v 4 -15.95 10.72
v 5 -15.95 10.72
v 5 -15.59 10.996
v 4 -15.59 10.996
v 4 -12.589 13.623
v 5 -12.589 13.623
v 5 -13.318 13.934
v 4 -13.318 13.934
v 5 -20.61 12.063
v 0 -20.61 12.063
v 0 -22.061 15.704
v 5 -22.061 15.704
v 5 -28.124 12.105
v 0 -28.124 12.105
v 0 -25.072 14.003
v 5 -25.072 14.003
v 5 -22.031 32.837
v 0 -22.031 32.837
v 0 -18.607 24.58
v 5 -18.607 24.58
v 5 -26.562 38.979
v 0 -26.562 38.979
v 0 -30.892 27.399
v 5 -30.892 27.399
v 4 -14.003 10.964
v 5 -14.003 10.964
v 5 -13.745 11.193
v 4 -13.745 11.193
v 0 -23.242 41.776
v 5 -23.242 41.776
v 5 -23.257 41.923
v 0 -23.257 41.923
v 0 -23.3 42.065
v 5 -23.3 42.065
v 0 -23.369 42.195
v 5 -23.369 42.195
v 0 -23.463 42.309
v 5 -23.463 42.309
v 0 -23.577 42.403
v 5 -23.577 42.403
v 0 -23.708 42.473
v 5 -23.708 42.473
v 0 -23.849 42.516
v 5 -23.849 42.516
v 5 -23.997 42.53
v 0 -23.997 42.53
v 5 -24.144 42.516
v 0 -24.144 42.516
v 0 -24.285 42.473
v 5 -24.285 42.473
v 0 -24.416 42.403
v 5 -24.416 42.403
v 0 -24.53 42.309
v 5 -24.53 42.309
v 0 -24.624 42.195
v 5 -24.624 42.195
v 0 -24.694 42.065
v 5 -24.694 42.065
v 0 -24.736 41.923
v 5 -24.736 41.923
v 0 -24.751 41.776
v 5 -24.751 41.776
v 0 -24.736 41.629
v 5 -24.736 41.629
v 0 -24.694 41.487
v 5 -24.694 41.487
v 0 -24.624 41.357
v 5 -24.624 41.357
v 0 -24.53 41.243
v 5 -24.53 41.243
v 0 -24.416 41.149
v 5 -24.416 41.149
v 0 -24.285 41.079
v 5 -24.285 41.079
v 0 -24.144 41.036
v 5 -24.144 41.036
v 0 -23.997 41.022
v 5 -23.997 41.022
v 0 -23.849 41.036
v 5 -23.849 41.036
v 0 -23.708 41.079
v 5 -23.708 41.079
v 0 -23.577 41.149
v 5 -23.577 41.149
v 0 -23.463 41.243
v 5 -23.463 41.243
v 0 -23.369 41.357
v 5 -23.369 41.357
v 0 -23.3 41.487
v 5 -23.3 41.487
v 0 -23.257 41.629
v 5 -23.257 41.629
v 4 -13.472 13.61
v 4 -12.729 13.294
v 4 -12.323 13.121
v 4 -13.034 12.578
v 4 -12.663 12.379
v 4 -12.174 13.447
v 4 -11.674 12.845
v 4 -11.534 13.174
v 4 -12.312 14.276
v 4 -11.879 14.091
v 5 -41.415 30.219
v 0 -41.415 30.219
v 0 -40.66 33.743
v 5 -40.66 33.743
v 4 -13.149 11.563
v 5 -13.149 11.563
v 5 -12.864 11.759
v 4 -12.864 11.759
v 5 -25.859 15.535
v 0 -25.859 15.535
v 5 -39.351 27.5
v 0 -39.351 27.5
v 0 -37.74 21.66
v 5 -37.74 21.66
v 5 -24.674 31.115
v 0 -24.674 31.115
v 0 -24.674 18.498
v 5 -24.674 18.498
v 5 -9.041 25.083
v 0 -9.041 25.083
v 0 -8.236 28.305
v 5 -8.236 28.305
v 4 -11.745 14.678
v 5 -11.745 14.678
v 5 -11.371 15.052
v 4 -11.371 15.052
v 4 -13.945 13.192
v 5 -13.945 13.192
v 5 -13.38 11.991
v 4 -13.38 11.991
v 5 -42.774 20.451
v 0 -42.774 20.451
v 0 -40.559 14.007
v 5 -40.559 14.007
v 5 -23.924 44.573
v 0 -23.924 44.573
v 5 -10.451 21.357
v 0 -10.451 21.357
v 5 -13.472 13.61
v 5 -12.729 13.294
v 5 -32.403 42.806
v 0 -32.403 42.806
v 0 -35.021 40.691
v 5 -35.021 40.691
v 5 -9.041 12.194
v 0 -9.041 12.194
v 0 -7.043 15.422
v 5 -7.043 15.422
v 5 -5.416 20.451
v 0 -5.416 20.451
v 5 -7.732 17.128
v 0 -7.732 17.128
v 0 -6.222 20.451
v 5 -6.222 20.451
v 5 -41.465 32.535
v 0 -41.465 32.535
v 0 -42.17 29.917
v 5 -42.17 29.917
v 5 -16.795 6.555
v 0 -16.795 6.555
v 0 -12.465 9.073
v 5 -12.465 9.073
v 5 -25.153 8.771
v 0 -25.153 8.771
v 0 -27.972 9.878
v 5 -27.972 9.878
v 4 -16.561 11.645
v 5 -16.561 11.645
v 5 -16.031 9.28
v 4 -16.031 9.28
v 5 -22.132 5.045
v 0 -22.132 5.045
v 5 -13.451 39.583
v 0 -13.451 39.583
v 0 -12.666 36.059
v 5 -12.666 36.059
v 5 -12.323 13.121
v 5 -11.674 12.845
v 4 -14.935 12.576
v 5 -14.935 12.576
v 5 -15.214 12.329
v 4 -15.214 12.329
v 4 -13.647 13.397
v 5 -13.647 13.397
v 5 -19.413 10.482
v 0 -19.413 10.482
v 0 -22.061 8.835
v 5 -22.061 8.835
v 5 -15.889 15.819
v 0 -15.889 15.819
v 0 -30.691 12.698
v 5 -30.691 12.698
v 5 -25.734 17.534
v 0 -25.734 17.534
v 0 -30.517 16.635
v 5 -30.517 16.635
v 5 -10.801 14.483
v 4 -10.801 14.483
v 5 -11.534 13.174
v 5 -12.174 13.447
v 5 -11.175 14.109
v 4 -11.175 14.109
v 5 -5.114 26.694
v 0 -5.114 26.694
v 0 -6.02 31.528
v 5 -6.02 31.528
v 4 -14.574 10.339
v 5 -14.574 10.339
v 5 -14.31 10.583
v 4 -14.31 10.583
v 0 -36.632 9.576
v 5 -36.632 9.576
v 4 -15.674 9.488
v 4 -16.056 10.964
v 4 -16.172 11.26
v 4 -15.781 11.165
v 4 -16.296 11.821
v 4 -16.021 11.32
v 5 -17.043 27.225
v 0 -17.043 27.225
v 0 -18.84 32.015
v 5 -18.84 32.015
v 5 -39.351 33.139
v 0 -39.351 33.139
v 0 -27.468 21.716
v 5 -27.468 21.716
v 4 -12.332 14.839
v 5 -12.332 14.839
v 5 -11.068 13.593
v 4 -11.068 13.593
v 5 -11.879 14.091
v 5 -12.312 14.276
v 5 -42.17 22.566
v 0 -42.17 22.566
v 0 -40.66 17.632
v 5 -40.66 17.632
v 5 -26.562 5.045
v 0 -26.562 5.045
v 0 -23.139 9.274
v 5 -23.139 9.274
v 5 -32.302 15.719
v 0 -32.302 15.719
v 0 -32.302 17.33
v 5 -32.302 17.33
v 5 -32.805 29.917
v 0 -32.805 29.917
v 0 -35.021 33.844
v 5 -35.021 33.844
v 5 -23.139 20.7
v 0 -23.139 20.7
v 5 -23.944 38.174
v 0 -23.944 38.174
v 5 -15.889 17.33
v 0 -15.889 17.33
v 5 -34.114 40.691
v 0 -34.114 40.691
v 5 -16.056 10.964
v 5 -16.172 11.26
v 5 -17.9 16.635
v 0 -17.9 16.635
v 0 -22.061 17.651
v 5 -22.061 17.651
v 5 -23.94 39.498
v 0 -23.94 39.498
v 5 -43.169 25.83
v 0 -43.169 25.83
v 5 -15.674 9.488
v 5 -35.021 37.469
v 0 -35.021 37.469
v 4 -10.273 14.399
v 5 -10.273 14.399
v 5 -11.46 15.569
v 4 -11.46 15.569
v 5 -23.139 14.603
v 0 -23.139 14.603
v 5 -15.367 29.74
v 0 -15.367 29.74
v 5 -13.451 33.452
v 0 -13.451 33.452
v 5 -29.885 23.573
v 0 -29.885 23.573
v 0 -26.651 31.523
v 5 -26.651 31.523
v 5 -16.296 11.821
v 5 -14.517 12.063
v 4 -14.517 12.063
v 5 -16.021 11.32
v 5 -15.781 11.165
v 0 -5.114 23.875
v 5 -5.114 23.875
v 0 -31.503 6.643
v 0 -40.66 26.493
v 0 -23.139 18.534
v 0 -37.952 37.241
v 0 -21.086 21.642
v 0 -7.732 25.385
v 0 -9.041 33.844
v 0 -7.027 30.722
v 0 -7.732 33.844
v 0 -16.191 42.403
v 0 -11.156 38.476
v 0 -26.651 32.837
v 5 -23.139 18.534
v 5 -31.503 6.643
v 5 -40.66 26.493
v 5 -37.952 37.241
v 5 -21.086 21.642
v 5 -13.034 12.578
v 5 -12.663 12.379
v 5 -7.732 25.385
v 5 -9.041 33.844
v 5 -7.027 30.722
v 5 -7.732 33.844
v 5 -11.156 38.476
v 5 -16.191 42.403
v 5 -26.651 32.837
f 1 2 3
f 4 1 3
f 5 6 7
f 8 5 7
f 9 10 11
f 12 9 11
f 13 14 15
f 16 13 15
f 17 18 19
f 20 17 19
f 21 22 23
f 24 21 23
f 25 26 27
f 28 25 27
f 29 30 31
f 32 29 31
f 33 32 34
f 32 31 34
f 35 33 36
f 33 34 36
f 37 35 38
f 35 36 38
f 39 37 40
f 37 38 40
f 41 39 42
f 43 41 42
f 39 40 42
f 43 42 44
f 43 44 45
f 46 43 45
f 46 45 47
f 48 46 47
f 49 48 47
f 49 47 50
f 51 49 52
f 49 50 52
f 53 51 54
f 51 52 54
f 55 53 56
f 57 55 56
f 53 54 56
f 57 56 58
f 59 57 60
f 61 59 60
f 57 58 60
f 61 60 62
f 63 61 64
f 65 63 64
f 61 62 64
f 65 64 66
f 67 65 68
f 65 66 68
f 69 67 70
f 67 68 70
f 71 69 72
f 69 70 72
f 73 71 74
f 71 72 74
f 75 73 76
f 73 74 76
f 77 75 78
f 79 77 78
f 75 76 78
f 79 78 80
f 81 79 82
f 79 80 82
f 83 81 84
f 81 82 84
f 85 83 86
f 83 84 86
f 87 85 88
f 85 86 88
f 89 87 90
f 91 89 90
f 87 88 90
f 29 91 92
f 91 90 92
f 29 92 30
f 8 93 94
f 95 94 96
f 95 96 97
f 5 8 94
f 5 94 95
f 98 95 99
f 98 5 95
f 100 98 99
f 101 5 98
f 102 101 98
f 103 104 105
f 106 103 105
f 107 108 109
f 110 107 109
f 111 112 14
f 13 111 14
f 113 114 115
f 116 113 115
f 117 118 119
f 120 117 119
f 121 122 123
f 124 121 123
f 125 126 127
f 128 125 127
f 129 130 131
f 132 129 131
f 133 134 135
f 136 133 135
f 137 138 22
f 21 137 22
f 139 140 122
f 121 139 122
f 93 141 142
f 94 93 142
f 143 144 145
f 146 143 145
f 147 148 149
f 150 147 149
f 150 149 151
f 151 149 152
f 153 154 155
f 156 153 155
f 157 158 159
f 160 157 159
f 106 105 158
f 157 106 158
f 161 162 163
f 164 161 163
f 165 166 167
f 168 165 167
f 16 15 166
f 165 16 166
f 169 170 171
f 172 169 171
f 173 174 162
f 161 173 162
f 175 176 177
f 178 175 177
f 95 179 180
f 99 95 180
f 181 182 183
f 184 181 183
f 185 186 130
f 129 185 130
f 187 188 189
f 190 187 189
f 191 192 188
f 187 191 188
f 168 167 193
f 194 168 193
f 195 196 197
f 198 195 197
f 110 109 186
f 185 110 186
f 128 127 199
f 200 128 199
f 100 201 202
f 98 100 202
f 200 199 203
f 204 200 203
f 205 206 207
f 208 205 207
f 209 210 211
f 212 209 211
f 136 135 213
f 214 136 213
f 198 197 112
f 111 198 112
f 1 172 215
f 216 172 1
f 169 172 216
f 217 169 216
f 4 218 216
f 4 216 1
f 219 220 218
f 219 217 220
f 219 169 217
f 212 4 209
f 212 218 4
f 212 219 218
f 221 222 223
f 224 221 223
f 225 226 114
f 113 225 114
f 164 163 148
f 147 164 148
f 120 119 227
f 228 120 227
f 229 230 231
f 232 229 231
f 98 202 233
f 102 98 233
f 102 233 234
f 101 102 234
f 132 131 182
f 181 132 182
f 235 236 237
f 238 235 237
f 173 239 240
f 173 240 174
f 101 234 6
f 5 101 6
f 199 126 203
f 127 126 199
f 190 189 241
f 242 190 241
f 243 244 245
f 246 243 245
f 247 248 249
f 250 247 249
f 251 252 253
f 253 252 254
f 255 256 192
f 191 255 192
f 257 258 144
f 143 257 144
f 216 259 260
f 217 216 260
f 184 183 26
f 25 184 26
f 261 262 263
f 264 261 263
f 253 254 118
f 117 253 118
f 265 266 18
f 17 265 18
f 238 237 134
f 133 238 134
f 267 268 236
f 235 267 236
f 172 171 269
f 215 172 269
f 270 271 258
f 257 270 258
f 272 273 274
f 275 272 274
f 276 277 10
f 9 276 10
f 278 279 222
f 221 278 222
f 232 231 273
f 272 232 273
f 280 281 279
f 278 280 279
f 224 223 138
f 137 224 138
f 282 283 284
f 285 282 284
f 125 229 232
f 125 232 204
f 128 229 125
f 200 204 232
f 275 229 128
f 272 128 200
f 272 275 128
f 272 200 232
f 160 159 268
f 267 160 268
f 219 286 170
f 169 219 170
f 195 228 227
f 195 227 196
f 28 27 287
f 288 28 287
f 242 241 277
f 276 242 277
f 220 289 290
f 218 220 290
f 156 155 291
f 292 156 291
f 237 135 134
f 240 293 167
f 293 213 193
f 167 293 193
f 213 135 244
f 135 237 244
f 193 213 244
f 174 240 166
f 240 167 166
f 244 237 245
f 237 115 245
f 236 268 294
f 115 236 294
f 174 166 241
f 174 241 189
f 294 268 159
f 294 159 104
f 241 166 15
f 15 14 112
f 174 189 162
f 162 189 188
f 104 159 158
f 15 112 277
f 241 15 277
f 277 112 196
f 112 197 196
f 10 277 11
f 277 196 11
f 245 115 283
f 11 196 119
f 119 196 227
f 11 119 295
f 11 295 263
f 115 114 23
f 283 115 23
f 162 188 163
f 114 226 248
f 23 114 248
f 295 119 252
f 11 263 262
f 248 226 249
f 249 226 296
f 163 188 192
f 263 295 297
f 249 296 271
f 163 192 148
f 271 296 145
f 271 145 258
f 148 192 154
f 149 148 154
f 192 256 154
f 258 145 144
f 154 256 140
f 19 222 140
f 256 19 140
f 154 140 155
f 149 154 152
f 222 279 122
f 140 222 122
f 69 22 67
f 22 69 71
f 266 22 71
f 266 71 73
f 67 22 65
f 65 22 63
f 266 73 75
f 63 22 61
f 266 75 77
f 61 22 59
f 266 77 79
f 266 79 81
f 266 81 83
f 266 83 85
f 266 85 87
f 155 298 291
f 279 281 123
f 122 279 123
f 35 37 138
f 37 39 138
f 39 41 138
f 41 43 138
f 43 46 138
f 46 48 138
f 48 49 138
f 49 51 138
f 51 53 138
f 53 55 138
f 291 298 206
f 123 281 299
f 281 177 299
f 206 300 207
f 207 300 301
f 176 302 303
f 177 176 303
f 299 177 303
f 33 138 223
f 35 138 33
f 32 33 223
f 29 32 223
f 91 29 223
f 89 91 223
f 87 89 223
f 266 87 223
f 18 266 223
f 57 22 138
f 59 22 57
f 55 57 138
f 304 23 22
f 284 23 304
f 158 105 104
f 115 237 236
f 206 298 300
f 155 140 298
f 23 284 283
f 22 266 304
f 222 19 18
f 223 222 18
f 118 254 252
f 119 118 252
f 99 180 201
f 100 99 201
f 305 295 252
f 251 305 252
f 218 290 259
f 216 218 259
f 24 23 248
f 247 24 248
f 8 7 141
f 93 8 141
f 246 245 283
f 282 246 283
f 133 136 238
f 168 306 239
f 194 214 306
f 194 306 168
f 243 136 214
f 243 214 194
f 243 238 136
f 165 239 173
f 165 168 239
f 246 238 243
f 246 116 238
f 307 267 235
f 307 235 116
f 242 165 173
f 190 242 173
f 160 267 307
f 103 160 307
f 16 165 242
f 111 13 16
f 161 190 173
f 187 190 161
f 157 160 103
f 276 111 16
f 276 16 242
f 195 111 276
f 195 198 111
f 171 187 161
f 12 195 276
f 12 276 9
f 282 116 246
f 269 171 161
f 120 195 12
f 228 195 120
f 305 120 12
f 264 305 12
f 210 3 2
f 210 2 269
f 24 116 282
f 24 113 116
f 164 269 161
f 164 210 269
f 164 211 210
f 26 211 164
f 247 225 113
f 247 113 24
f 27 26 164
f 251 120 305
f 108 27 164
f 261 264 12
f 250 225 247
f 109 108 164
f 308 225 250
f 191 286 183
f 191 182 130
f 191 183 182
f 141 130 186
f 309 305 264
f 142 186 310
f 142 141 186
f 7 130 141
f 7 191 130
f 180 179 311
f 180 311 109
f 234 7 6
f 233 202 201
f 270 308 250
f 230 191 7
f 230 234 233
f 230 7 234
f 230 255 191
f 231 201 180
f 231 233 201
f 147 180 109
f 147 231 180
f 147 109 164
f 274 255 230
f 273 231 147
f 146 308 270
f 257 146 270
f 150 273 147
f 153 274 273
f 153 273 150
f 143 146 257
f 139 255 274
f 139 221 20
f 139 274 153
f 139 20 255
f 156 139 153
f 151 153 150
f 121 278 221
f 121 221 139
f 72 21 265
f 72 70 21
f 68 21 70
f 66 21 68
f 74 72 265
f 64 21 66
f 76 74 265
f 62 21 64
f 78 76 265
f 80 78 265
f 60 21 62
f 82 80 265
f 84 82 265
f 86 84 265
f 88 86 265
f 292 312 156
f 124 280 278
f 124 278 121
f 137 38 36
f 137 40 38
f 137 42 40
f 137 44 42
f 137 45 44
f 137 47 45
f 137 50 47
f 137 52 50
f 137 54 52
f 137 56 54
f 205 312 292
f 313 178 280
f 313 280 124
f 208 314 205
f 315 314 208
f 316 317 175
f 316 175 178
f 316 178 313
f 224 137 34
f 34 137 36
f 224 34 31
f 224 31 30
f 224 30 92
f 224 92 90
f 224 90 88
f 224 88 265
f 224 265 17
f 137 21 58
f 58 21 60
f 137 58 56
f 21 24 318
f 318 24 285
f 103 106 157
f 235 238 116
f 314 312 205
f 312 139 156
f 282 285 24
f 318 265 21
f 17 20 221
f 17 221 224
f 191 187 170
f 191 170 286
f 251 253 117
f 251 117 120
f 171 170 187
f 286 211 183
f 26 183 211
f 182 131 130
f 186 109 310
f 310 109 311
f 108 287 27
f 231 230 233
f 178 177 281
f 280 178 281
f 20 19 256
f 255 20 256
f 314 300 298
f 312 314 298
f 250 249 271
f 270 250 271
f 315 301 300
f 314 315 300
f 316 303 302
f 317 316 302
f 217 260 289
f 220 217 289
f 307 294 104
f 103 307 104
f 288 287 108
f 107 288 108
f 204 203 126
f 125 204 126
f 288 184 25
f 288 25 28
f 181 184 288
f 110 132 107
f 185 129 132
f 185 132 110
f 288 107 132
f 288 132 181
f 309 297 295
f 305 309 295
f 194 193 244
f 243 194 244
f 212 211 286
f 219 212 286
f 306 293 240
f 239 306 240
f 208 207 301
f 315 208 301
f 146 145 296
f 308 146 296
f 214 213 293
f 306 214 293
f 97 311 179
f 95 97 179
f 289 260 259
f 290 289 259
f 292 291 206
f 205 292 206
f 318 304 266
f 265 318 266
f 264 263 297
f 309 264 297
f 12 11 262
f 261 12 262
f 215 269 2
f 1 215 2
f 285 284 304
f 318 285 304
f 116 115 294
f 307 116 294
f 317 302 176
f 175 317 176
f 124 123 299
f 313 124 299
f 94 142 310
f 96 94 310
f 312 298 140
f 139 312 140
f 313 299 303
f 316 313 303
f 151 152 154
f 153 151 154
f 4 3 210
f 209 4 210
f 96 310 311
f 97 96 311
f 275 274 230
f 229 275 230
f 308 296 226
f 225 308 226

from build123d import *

# Parameters (mm, degrees)
F1_DEPTH = 5
F2_R     = 0.7543712854
F3_DEPTH = 5
F5_DEPTH = 1


# Not quite as in the source:
# - a feature names something its author has since deleted; it is built from what else it names


with BuildPart() as f1:
    # F0 (on Right) → F1 (new body)
    with BuildSketch(Plane.YZ):
        Polygon((-18.8395921141, 32.0152118802), (-23.9240508527, 44.5727854967), (-23.9400436678, 39.4980984787), (-22.0310017467, 32.8367650509), (-18.6073519289, 24.5797261596), (-15.8885698766, 17.3296425492), (-15.8885698766, 15.8192086965), (-19.4129161537, 10.4823429137), (-22.0608360687, 8.8354363138), (-22.1316963434, 5.0447816029), (-16.7948305607, 6.5552145243), (-12.4649200588, 9.0726036578), (-9.0412702411, 12.1941678226), (-7.0434443557, 15.421631052), (-5.4162289016, 20.4512067139), (-7.732226979, 17.128251493), (-6.221793592, 20.4512067139), (-5.1141423173, 23.8748565316), (-5.1141423173, 26.6943331808), (-6.0204025358, 31.5277203918), (-7.732226979, 33.8437184691), (-7.0273578167, 30.722156167), (-7.732226979, 25.3852903843), (-10.4510085657, 21.3574655354), (-9.0412702411, 25.0832028687), (-8.2357050851, 28.3054616302), (-9.0412702411, 33.8437184691), (-11.1558772624, 38.4757146239), (-16.1906573921, 42.4028448761), (-13.4509364143, 39.5833663642), (-12.666311115, 36.0590219498), (-13.4509364143, 33.4521867335), (-15.3669025749, 29.7400020063), (-17.0433744788, 27.2252950817), align=None)
        Polygon((-23.9400436678, 39.4980984787), (-23.9240508527, 44.5727854967), (-26.5623033047, 38.9791950583), (-30.8922119439, 27.3992009461), (-32.8054279089, 29.9165919423), (-35.0207313895, 33.8437184691), (-35.0207313895, 37.4687612057), (-34.114472568, 40.6910181046), (-32.4026457965, 42.8056269884), (-35.0207313895, 40.6910181046), (-37.9520406538, 37.2414154054), (-39.350643754, 33.1388488412), (-39.350643754, 27.4998974055), (-37.7395115793, 21.659553051), (-40.6596846879, 26.492940262), (-41.4149016142, 30.2186775953), (-40.6596846879, 33.7430238724), (-41.4652489126, 32.5346775353), (-42.1701185405, 29.9165919423), (-43.169213802, 25.8295247582), (-42.1701185405, 22.5658137351), (-40.6596846879, 17.6317300647), (-42.7742935717, 20.4512067139), (-40.5589900911, 14.0066882595), (-36.631859839, 9.5760822296), (-31.5034037335, 6.6433727204), (-26.5623033047, 5.0447816029), (-25.1525640488, 8.7705180049), (-27.9720406979, 9.8781688139), (-30.6908208877, 12.697645463), (-32.3019511998, 15.7185140997), (-32.3019511998, 17.3296425492), (-29.885256663, 23.572769016), (-26.6505166424, 31.5225556516), (-26.6505166424, 32.8367650509), align=None)
        Polygon((-22.1316963434, 5.0447816029), (-22.0608360687, 8.8354363138), (-23.1386516243, 9.2739956453), (-23.1386516243, 14.6031556651), (-25.0721577589, 14.0031509837), (-25.1525640488, 8.7705180049), (-26.5623033047, 5.0447816029), align=None)
        Polygon((-23.1386516243, 20.699724555), (-23.9442177117, 38.1736308336), (-24.6739685535, 31.1146955937), (-24.6739685535, 24.4254041463), (-24.6739685535, 18.4981841594), (-27.4682287127, 21.715817973), (-25.7342918677, 17.5339697332), (-30.516512692, 16.6353452951), (-25.8594118059, 15.5345760286), (-28.1243625509, 12.1047943952), (-25.0721577589, 14.0031509837), (-23.1386516243, 14.6031556651), (-20.6095892936, 12.0629183948), (-22.0608360687, 15.7039240003), (-17.9000031203, 16.6353452951), (-22.0608360687, 17.6514387131), (-21.0862746716, 21.6422008803), (-23.1386516243, 18.5343166173), align=None)
    extrude(amount=F1_DEPTH)

    # F2 (on face) → F3 (cut)
    with BuildSketch(Plane.YZ.offset(5)):
        with Locations((-23.9965710789, 41.7759902775)):
            Circle(F2_R)
    extrude(amount=-F3_DEPTH, mode=Mode.SUBTRACT)

    # F4 (on face) → F5 (cut)
    with BuildSketch(Plane.YZ.offset(5)):
        Polygon((-16.5610130304, 11.6452822793), (-16.0314254463, 9.2795155942), (-15.6742927399, 9.4880603932), (-15.9501638263, 10.7204280794), (-15.5902979895, 10.9956199303), (-14.5742027089, 10.3393923491), (-14.309595339, 10.5828316882), (-16.2962192383, 11.8211973459), align=None)
        Polygon((-15.7808158547, 11.1649697646), (-16.056008637, 10.9638674185), (-16.1724351346, 11.2602282315), (-16.0208165755, 11.319792172), align=None, mode=Mode.SUBTRACT)
        Polygon((-15.2138965204, 12.3287355527), (-14.0034528449, 10.9638674185), (-13.7453717467, 11.1927486014), (-14.5170884397, 12.0629183948), (-13.149023056, 11.563308537), (-12.8642125055, 11.759115383), (-13.6474408209, 13.3967734873), (-13.9450938452, 13.192137459), (-13.3804315701, 11.9905229658), (-14.9350901603, 12.5759970916), align=None)
        Polygon((-13.31801555, 13.93365104), (-13.4715074673, 13.610381633), (-12.7293292628, 13.2944049069), (-12.5892657792, 13.6233913674), align=None)
        Polygon((-12.5892657792, 13.6233913674), (-12.7293292628, 13.2944049069), (-12.3227360628, 13.1213009442), (-12.1738159695, 13.4465167705), align=None)
        Polygon((-12.3227360628, 13.1213009442), (-12.7293292628, 13.2944049069), (-13.0343568597, 12.5779444352), (-12.6627200979, 12.3788343877), align=None)
        Polygon((-12.1738159695, 13.4465167705), (-12.3227360628, 13.1213009442), (-11.6736432537, 12.8449546173), (-11.5335797702, 13.1739410778), align=None)
        Polygon((-12.3115735045, 14.2756455901), (-12.5892657792, 13.6233913674), (-12.1738159695, 13.4465167705), (-11.8785644276, 14.0912952688), align=None)
        Polygon((-11.4597871365, 15.568957784), (-12.3322671279, 14.8386247456), (-11.0684223473, 13.5925812647), (-10.2732402928, 14.3991234958), align=None)
        Polygon((-11.7448461242, 14.678419102), (-11.3710323349, 15.0522328913), (-10.8014121652, 14.4826127216), (-11.1752259545, 14.1087989323), align=None, mode=Mode.SUBTRACT)
    extrude(amount=-F5_DEPTH, mode=Mode.SUBTRACT)


solid = f1.part
